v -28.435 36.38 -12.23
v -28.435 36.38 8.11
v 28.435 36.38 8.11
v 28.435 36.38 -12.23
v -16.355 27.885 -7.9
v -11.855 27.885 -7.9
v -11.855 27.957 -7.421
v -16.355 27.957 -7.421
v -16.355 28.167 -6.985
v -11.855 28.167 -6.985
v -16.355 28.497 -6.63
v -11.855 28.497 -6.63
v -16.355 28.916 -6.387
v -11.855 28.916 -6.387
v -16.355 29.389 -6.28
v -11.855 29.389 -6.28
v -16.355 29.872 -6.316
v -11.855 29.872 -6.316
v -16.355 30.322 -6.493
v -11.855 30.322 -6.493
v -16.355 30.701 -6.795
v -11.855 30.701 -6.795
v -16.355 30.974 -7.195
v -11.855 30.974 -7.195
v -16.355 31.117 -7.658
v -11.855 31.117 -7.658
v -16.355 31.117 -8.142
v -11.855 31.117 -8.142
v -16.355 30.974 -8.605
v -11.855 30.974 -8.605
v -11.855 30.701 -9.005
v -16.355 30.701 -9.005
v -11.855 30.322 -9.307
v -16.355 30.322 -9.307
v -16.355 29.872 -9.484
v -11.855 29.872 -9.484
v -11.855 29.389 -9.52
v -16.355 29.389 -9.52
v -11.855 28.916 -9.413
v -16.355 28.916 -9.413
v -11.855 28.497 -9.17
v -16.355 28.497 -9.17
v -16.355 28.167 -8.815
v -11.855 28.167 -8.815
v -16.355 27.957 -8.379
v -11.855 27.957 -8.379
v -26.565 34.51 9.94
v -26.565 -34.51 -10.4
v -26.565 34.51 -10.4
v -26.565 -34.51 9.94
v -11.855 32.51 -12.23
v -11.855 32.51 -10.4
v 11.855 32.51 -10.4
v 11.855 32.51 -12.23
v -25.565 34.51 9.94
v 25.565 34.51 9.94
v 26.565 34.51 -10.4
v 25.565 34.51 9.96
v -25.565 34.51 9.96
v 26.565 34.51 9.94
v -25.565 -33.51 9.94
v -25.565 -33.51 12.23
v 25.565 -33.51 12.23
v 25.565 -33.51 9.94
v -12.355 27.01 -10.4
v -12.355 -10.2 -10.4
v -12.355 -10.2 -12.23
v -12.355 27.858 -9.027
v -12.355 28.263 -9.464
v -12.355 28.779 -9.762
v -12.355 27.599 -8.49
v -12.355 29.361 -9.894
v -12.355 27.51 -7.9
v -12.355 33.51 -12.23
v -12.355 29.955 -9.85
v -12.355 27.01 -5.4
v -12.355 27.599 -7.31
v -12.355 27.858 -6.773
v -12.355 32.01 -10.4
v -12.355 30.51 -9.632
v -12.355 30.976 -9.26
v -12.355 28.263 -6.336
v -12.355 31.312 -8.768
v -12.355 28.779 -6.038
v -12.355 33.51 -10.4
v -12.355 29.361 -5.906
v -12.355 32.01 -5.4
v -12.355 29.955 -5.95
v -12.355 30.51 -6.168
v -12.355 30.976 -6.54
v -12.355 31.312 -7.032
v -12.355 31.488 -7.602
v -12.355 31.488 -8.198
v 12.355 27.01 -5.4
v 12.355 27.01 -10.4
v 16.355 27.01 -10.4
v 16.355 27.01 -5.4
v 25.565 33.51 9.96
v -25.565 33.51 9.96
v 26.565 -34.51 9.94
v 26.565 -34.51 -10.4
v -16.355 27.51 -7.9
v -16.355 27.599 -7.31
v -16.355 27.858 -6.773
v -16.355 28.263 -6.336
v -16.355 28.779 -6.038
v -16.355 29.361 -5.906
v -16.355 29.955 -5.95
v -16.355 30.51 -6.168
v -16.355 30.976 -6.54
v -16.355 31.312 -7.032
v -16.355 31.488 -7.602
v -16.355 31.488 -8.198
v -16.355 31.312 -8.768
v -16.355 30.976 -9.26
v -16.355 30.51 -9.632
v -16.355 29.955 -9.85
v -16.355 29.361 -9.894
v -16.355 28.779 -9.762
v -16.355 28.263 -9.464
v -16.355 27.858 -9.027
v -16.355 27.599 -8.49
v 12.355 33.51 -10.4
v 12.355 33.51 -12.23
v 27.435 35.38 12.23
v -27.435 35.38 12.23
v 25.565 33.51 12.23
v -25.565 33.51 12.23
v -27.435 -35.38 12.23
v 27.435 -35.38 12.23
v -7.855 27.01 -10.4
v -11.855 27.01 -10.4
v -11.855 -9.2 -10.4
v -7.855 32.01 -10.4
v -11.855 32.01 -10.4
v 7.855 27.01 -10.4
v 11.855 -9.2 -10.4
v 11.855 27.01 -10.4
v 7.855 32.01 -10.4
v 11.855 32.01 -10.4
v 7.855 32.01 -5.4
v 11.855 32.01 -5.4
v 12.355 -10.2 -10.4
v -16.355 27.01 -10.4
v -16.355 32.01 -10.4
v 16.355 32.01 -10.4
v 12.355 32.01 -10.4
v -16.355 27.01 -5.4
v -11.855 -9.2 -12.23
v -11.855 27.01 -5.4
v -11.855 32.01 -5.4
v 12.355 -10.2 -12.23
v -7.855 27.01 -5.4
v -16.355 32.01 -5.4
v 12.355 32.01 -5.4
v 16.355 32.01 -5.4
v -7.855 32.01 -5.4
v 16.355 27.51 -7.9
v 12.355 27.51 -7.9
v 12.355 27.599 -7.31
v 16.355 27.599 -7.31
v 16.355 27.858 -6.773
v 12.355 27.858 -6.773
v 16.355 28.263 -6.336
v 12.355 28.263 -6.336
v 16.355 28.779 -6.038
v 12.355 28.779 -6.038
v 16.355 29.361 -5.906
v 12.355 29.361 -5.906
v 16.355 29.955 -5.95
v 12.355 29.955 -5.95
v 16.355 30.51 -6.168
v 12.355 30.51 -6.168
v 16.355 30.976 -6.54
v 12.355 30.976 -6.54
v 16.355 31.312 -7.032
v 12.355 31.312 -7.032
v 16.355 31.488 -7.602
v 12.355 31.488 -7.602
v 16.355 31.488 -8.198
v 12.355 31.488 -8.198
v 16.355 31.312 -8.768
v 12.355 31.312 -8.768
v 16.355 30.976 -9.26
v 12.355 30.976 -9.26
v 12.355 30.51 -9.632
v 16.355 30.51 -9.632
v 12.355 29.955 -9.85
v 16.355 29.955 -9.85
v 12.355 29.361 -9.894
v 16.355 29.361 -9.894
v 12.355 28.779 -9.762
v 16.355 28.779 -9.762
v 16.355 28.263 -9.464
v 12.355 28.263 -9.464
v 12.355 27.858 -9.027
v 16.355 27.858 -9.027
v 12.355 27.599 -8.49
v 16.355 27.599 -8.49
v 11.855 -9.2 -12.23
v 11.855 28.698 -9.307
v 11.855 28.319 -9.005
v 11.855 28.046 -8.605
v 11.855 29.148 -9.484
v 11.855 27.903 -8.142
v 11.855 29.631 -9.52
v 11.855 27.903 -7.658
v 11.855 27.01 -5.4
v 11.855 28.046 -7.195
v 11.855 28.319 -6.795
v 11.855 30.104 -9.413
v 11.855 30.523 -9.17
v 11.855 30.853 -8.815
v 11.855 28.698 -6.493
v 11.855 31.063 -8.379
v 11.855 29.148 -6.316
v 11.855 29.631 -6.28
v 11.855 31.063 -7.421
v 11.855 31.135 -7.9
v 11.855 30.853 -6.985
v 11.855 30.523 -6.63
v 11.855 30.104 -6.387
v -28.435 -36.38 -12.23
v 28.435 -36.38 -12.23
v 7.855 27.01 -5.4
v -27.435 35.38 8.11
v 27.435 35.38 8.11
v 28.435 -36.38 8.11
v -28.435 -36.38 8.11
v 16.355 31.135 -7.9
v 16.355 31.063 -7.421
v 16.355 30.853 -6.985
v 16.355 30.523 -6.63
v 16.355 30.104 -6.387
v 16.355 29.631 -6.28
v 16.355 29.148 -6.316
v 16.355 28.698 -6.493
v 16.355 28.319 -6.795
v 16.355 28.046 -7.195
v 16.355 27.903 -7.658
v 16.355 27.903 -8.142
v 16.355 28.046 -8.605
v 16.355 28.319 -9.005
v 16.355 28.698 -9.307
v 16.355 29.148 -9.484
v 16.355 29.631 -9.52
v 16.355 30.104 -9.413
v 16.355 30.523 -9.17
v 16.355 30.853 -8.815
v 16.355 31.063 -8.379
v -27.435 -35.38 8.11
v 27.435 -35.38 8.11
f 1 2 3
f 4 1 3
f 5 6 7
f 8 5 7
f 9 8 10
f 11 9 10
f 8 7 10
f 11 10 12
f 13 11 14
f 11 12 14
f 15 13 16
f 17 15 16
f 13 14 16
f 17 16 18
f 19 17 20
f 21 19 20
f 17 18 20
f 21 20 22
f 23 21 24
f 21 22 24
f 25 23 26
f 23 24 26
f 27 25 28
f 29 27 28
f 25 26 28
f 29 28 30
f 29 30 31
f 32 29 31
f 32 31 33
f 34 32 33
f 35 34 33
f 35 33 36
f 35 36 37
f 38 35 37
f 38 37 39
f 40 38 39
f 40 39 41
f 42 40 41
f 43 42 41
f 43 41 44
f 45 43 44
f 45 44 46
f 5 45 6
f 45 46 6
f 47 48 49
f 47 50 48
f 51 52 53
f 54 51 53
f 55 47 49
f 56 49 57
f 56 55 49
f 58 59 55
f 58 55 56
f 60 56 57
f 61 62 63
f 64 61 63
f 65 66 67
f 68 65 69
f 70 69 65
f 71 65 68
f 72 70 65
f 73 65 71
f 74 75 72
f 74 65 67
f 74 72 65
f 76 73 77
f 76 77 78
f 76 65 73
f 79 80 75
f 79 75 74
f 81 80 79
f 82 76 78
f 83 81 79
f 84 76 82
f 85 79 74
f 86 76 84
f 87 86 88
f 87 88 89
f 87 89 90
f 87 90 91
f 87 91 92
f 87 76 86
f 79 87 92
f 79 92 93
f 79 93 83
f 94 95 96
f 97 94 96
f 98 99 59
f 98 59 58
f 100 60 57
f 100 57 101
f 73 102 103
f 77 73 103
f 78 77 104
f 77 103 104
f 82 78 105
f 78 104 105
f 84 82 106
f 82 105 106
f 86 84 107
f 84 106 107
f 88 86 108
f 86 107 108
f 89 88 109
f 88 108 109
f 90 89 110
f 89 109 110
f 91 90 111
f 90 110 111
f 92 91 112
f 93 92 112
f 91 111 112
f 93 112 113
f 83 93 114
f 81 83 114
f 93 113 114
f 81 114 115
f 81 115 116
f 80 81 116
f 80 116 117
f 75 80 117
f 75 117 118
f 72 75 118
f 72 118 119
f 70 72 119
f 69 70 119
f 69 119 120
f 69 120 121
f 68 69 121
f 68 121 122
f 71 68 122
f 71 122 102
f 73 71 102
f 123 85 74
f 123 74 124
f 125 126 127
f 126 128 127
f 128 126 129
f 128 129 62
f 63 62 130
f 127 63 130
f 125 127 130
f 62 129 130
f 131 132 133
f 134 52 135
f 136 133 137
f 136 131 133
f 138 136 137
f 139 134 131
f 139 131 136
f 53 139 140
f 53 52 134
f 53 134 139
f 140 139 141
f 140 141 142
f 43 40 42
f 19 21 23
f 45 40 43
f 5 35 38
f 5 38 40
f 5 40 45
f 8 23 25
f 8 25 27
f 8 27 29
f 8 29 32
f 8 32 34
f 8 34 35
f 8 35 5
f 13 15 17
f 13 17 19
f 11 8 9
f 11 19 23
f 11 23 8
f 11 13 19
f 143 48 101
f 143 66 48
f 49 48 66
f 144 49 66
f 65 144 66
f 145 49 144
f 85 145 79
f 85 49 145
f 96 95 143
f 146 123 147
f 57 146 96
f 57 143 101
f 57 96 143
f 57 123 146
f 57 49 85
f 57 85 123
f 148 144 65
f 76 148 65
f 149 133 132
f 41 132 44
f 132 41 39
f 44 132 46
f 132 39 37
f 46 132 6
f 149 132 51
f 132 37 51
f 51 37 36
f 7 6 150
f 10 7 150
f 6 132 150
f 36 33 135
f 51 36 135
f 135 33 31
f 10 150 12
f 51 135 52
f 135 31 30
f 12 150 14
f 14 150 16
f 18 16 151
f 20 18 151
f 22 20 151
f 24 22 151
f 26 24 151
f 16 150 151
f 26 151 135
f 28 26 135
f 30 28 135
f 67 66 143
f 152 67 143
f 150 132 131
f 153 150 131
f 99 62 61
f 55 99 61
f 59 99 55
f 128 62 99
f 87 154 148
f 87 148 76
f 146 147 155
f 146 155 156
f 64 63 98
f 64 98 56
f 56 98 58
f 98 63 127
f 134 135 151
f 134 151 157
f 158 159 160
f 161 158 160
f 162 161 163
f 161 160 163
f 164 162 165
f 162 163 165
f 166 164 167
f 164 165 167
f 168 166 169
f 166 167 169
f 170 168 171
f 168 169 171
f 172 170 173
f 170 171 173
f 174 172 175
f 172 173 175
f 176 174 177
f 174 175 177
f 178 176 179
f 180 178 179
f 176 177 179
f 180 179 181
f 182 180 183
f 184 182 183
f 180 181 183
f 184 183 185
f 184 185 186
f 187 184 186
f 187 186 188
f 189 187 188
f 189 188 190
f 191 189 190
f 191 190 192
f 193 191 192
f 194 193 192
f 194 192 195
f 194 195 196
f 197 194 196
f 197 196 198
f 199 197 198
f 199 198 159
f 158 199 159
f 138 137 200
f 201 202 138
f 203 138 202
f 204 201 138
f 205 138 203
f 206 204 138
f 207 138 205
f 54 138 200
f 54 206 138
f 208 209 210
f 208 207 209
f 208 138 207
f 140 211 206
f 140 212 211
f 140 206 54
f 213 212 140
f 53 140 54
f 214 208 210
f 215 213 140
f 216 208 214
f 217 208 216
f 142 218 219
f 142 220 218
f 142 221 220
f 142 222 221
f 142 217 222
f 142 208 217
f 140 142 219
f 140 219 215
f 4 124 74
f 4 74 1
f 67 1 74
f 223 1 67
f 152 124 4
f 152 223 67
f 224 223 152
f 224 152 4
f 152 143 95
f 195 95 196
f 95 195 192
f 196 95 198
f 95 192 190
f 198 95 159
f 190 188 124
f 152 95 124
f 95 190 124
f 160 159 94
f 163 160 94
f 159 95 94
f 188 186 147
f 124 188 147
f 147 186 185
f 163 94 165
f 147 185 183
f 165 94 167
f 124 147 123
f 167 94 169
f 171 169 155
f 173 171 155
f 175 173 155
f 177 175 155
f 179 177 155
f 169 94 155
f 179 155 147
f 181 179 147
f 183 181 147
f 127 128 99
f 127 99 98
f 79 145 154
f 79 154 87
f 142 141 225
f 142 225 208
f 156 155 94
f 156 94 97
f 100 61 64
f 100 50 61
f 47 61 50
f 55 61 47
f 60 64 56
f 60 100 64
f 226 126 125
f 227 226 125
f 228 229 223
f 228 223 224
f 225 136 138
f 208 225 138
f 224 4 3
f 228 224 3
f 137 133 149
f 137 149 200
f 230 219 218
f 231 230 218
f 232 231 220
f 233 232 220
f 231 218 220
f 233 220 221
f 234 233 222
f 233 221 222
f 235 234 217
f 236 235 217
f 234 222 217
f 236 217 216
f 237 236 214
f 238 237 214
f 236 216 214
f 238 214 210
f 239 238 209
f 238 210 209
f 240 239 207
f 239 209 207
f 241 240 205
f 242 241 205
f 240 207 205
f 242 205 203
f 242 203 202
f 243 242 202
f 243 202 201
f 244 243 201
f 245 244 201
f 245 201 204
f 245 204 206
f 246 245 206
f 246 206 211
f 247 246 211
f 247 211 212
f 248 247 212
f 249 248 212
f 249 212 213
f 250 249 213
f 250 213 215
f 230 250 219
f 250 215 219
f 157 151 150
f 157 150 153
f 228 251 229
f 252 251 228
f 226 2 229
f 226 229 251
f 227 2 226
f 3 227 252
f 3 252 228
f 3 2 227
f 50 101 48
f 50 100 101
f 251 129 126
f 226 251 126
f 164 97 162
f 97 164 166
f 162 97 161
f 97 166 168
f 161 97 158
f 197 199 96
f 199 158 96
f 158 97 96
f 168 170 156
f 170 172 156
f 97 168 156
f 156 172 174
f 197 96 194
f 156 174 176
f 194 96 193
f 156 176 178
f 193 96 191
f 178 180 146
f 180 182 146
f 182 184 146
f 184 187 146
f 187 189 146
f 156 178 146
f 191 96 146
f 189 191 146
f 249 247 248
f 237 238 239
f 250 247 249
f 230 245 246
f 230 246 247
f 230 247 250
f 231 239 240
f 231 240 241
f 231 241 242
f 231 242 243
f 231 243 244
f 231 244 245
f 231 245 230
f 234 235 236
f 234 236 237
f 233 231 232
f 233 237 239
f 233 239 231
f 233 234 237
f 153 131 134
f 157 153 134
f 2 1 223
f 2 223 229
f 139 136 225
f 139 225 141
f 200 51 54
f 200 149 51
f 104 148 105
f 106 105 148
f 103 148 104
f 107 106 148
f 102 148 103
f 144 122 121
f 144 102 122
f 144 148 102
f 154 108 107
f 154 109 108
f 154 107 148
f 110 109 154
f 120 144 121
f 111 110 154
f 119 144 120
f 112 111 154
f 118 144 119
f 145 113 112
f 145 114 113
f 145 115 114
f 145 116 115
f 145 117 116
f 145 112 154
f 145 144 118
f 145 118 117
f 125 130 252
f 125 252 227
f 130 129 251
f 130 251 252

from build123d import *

# Parameters (mm, degrees)
F0_W      = 56.87
F0_H      = 24.46
F1_DEPTH  = 36.38
F2_W      = 51.13
F2_H      = 67.02
F3_DEPTH  = 22.63
F4_W      = 51.13
F4_H      = 20.36
F5_DEPTH  = 1
F6_W      = 68.02
F6_H      = 20.34
F7_DEPTH  = 1
F8_W      = 52.13
F8_H      = 20.34
F9_DEPTH  = 1
F10_W     = 69.02
F10_H     = 20.34
F11_DEPTH = 1
F12_W     = 56.87
F12_H     = 72.76
F12_W_2   = 54.87
F12_H_2   = 70.76
F13_DEPTH = 4.12
F15_W     = 4
F15_H     = 5
F16_DEPTH = 5
F17_W     = 4
F17_H     = 5
F18_DEPTH = 5
F19_R     = 2
F20_DEPTH = 32.71
F14_W     = 24.71
F14_H     = 43.71
F14_W_2   = 23.71
F14_H_2   = 42.71
F21_DEPTH = 1.831
F22_W     = 4
F22_H     = 5
F23_DEPTH = 5
F24_R     = 1.625
F25_DEPTH = 4.5
F26_R     = 1.625
F27_DEPTH = 4.5
F28_W     = 23.71
F28_H     = 0.5
F29_DEPTH = 1.831


with BuildPart() as f1:
    # F0 (on Front) → F1 (new body, symmetric)
    with BuildSketch(Plane.XZ):
        Rectangle(F0_W, F0_H)
    extrude(amount=F1_DEPTH, both=True)

    # F2 (on face) → F3 (cut)
    with BuildSketch(Plane.XY.offset(12.23)):
        Rectangle(F2_W, F2_H)
    extrude(amount=-F3_DEPTH, mode=Mode.SUBTRACT)

    # F4 (on face) → F5 (cut)
    with BuildSketch(Plane.XZ.offset(-33.51)):
        with Locations((0, -0.22)):
            Rectangle(F4_W, F4_H)
    extrude(amount=-F5_DEPTH, mode=Mode.SUBTRACT)

    # F6 (on face) → F7 (cut)
    with BuildSketch(Plane.YZ.offset(-25.565)):
        with Locations((0.5, -0.23)):
            Rectangle(F6_W, F6_H)
    extrude(amount=-F7_DEPTH, mode=Mode.SUBTRACT)

    # F8 (on face) → F9 (cut)
    with BuildSketch(Plane(origin=(0, -33.51, 0), x_dir=(-1, 0, 0), z_dir=(0, 1, 0))):
        with Locations((0.5, -0.23)):
            Rectangle(F8_W, F8_H)
    extrude(amount=-F9_DEPTH, mode=Mode.SUBTRACT)

    # F10 (on face) → F11 (cut)
    with BuildSketch(Plane(origin=(25.565, 0, 0), x_dir=(0, -1, 0), z_dir=(-1, 0, 0))):
        with Locations((0, -0.23)):
            Rectangle(F10_W, F10_H)
    extrude(amount=-F11_DEPTH, mode=Mode.SUBTRACT)

    # F12 (on face) → F13 (cut)
    with BuildSketch(Plane.XY.offset(12.23)):
        Rectangle(F12_W, F12_H)
        Rectangle(F12_W_2, F12_H_2, mode=Mode.SUBTRACT)
    extrude(amount=-F13_DEPTH, mode=Mode.SUBTRACT)

    # F15 (on face) → F16 (join)
    with BuildSketch(Plane.XY.offset(-10.4)):
        with Locations((-14.355, 29.51)):
            Rectangle(F15_W, F15_H)
    extrude(amount=F16_DEPTH)

    # F17 (on face) → F18 (join)
    with BuildSketch(Plane.XY.offset(-10.4)):
        with Locations((14.355, 29.51)):
            Rectangle(F17_W, F17_H)
    extrude(amount=F18_DEPTH)

    # F19 (on face) → F20 (cut, through all)
    with BuildSketch(Plane(origin=(-16.355, 0, 0), x_dir=(0, -1, 0), z_dir=(-1, 0, 0))):
        with Locations((-29.51, -7.9)):
            Circle(F19_R)
    extrude(amount=-F20_DEPTH, mode=Mode.SUBTRACT)

    # F14 (on face) → F21 (cut, through all)
    with BuildSketch(Plane.XY.offset(-10.4)):
        with Locations((0, 11.655)):
            Rectangle(F14_W, F14_H)
        with Locations((0, 11.655)):
            Rectangle(F14_W_2, F14_H_2, mode=Mode.SUBTRACT)
    extrude(amount=-F21_DEPTH, mode=Mode.SUBTRACT)

    # F22 (on face) → F23 (join)
    with BuildSketch(Plane.XY.offset(-10.4)):
        with Locations((-9.855, 29.51)):
            Rectangle(F22_W, F22_H)
        with Locations((9.855, 29.51)):
            Rectangle(F22_W, F22_H)
    extrude(amount=F23_DEPTH)

    # F24 (on face) → F25 (join)
    with BuildSketch(Plane(origin=(-11.855, 0, 0), x_dir=(0, -1, 0), z_dir=(-1, 0, 0))):
        with Locations((-29.51, -7.9)):
            Circle(F24_R)
    extrude(amount=F25_DEPTH)

    # F26 (on face) → F27 (join)
    with BuildSketch(Plane.YZ.offset(11.855)):
        with Locations((29.51, -7.9)):
            Circle(F26_R)
    extrude(amount=F27_DEPTH)

    # F28 (on face) → F29 (cut, through all)
    with BuildSketch(Plane.XY.offset(-10.4)):
        with Locations((0, 32.76)):
            Rectangle(F28_W, F28_H)
        with Locations((0, -9.45)):
            Rectangle(F28_W, F28_H)
    extrude(amount=-F29_DEPTH, mode=Mode.SUBTRACT)


solid = f1.part
